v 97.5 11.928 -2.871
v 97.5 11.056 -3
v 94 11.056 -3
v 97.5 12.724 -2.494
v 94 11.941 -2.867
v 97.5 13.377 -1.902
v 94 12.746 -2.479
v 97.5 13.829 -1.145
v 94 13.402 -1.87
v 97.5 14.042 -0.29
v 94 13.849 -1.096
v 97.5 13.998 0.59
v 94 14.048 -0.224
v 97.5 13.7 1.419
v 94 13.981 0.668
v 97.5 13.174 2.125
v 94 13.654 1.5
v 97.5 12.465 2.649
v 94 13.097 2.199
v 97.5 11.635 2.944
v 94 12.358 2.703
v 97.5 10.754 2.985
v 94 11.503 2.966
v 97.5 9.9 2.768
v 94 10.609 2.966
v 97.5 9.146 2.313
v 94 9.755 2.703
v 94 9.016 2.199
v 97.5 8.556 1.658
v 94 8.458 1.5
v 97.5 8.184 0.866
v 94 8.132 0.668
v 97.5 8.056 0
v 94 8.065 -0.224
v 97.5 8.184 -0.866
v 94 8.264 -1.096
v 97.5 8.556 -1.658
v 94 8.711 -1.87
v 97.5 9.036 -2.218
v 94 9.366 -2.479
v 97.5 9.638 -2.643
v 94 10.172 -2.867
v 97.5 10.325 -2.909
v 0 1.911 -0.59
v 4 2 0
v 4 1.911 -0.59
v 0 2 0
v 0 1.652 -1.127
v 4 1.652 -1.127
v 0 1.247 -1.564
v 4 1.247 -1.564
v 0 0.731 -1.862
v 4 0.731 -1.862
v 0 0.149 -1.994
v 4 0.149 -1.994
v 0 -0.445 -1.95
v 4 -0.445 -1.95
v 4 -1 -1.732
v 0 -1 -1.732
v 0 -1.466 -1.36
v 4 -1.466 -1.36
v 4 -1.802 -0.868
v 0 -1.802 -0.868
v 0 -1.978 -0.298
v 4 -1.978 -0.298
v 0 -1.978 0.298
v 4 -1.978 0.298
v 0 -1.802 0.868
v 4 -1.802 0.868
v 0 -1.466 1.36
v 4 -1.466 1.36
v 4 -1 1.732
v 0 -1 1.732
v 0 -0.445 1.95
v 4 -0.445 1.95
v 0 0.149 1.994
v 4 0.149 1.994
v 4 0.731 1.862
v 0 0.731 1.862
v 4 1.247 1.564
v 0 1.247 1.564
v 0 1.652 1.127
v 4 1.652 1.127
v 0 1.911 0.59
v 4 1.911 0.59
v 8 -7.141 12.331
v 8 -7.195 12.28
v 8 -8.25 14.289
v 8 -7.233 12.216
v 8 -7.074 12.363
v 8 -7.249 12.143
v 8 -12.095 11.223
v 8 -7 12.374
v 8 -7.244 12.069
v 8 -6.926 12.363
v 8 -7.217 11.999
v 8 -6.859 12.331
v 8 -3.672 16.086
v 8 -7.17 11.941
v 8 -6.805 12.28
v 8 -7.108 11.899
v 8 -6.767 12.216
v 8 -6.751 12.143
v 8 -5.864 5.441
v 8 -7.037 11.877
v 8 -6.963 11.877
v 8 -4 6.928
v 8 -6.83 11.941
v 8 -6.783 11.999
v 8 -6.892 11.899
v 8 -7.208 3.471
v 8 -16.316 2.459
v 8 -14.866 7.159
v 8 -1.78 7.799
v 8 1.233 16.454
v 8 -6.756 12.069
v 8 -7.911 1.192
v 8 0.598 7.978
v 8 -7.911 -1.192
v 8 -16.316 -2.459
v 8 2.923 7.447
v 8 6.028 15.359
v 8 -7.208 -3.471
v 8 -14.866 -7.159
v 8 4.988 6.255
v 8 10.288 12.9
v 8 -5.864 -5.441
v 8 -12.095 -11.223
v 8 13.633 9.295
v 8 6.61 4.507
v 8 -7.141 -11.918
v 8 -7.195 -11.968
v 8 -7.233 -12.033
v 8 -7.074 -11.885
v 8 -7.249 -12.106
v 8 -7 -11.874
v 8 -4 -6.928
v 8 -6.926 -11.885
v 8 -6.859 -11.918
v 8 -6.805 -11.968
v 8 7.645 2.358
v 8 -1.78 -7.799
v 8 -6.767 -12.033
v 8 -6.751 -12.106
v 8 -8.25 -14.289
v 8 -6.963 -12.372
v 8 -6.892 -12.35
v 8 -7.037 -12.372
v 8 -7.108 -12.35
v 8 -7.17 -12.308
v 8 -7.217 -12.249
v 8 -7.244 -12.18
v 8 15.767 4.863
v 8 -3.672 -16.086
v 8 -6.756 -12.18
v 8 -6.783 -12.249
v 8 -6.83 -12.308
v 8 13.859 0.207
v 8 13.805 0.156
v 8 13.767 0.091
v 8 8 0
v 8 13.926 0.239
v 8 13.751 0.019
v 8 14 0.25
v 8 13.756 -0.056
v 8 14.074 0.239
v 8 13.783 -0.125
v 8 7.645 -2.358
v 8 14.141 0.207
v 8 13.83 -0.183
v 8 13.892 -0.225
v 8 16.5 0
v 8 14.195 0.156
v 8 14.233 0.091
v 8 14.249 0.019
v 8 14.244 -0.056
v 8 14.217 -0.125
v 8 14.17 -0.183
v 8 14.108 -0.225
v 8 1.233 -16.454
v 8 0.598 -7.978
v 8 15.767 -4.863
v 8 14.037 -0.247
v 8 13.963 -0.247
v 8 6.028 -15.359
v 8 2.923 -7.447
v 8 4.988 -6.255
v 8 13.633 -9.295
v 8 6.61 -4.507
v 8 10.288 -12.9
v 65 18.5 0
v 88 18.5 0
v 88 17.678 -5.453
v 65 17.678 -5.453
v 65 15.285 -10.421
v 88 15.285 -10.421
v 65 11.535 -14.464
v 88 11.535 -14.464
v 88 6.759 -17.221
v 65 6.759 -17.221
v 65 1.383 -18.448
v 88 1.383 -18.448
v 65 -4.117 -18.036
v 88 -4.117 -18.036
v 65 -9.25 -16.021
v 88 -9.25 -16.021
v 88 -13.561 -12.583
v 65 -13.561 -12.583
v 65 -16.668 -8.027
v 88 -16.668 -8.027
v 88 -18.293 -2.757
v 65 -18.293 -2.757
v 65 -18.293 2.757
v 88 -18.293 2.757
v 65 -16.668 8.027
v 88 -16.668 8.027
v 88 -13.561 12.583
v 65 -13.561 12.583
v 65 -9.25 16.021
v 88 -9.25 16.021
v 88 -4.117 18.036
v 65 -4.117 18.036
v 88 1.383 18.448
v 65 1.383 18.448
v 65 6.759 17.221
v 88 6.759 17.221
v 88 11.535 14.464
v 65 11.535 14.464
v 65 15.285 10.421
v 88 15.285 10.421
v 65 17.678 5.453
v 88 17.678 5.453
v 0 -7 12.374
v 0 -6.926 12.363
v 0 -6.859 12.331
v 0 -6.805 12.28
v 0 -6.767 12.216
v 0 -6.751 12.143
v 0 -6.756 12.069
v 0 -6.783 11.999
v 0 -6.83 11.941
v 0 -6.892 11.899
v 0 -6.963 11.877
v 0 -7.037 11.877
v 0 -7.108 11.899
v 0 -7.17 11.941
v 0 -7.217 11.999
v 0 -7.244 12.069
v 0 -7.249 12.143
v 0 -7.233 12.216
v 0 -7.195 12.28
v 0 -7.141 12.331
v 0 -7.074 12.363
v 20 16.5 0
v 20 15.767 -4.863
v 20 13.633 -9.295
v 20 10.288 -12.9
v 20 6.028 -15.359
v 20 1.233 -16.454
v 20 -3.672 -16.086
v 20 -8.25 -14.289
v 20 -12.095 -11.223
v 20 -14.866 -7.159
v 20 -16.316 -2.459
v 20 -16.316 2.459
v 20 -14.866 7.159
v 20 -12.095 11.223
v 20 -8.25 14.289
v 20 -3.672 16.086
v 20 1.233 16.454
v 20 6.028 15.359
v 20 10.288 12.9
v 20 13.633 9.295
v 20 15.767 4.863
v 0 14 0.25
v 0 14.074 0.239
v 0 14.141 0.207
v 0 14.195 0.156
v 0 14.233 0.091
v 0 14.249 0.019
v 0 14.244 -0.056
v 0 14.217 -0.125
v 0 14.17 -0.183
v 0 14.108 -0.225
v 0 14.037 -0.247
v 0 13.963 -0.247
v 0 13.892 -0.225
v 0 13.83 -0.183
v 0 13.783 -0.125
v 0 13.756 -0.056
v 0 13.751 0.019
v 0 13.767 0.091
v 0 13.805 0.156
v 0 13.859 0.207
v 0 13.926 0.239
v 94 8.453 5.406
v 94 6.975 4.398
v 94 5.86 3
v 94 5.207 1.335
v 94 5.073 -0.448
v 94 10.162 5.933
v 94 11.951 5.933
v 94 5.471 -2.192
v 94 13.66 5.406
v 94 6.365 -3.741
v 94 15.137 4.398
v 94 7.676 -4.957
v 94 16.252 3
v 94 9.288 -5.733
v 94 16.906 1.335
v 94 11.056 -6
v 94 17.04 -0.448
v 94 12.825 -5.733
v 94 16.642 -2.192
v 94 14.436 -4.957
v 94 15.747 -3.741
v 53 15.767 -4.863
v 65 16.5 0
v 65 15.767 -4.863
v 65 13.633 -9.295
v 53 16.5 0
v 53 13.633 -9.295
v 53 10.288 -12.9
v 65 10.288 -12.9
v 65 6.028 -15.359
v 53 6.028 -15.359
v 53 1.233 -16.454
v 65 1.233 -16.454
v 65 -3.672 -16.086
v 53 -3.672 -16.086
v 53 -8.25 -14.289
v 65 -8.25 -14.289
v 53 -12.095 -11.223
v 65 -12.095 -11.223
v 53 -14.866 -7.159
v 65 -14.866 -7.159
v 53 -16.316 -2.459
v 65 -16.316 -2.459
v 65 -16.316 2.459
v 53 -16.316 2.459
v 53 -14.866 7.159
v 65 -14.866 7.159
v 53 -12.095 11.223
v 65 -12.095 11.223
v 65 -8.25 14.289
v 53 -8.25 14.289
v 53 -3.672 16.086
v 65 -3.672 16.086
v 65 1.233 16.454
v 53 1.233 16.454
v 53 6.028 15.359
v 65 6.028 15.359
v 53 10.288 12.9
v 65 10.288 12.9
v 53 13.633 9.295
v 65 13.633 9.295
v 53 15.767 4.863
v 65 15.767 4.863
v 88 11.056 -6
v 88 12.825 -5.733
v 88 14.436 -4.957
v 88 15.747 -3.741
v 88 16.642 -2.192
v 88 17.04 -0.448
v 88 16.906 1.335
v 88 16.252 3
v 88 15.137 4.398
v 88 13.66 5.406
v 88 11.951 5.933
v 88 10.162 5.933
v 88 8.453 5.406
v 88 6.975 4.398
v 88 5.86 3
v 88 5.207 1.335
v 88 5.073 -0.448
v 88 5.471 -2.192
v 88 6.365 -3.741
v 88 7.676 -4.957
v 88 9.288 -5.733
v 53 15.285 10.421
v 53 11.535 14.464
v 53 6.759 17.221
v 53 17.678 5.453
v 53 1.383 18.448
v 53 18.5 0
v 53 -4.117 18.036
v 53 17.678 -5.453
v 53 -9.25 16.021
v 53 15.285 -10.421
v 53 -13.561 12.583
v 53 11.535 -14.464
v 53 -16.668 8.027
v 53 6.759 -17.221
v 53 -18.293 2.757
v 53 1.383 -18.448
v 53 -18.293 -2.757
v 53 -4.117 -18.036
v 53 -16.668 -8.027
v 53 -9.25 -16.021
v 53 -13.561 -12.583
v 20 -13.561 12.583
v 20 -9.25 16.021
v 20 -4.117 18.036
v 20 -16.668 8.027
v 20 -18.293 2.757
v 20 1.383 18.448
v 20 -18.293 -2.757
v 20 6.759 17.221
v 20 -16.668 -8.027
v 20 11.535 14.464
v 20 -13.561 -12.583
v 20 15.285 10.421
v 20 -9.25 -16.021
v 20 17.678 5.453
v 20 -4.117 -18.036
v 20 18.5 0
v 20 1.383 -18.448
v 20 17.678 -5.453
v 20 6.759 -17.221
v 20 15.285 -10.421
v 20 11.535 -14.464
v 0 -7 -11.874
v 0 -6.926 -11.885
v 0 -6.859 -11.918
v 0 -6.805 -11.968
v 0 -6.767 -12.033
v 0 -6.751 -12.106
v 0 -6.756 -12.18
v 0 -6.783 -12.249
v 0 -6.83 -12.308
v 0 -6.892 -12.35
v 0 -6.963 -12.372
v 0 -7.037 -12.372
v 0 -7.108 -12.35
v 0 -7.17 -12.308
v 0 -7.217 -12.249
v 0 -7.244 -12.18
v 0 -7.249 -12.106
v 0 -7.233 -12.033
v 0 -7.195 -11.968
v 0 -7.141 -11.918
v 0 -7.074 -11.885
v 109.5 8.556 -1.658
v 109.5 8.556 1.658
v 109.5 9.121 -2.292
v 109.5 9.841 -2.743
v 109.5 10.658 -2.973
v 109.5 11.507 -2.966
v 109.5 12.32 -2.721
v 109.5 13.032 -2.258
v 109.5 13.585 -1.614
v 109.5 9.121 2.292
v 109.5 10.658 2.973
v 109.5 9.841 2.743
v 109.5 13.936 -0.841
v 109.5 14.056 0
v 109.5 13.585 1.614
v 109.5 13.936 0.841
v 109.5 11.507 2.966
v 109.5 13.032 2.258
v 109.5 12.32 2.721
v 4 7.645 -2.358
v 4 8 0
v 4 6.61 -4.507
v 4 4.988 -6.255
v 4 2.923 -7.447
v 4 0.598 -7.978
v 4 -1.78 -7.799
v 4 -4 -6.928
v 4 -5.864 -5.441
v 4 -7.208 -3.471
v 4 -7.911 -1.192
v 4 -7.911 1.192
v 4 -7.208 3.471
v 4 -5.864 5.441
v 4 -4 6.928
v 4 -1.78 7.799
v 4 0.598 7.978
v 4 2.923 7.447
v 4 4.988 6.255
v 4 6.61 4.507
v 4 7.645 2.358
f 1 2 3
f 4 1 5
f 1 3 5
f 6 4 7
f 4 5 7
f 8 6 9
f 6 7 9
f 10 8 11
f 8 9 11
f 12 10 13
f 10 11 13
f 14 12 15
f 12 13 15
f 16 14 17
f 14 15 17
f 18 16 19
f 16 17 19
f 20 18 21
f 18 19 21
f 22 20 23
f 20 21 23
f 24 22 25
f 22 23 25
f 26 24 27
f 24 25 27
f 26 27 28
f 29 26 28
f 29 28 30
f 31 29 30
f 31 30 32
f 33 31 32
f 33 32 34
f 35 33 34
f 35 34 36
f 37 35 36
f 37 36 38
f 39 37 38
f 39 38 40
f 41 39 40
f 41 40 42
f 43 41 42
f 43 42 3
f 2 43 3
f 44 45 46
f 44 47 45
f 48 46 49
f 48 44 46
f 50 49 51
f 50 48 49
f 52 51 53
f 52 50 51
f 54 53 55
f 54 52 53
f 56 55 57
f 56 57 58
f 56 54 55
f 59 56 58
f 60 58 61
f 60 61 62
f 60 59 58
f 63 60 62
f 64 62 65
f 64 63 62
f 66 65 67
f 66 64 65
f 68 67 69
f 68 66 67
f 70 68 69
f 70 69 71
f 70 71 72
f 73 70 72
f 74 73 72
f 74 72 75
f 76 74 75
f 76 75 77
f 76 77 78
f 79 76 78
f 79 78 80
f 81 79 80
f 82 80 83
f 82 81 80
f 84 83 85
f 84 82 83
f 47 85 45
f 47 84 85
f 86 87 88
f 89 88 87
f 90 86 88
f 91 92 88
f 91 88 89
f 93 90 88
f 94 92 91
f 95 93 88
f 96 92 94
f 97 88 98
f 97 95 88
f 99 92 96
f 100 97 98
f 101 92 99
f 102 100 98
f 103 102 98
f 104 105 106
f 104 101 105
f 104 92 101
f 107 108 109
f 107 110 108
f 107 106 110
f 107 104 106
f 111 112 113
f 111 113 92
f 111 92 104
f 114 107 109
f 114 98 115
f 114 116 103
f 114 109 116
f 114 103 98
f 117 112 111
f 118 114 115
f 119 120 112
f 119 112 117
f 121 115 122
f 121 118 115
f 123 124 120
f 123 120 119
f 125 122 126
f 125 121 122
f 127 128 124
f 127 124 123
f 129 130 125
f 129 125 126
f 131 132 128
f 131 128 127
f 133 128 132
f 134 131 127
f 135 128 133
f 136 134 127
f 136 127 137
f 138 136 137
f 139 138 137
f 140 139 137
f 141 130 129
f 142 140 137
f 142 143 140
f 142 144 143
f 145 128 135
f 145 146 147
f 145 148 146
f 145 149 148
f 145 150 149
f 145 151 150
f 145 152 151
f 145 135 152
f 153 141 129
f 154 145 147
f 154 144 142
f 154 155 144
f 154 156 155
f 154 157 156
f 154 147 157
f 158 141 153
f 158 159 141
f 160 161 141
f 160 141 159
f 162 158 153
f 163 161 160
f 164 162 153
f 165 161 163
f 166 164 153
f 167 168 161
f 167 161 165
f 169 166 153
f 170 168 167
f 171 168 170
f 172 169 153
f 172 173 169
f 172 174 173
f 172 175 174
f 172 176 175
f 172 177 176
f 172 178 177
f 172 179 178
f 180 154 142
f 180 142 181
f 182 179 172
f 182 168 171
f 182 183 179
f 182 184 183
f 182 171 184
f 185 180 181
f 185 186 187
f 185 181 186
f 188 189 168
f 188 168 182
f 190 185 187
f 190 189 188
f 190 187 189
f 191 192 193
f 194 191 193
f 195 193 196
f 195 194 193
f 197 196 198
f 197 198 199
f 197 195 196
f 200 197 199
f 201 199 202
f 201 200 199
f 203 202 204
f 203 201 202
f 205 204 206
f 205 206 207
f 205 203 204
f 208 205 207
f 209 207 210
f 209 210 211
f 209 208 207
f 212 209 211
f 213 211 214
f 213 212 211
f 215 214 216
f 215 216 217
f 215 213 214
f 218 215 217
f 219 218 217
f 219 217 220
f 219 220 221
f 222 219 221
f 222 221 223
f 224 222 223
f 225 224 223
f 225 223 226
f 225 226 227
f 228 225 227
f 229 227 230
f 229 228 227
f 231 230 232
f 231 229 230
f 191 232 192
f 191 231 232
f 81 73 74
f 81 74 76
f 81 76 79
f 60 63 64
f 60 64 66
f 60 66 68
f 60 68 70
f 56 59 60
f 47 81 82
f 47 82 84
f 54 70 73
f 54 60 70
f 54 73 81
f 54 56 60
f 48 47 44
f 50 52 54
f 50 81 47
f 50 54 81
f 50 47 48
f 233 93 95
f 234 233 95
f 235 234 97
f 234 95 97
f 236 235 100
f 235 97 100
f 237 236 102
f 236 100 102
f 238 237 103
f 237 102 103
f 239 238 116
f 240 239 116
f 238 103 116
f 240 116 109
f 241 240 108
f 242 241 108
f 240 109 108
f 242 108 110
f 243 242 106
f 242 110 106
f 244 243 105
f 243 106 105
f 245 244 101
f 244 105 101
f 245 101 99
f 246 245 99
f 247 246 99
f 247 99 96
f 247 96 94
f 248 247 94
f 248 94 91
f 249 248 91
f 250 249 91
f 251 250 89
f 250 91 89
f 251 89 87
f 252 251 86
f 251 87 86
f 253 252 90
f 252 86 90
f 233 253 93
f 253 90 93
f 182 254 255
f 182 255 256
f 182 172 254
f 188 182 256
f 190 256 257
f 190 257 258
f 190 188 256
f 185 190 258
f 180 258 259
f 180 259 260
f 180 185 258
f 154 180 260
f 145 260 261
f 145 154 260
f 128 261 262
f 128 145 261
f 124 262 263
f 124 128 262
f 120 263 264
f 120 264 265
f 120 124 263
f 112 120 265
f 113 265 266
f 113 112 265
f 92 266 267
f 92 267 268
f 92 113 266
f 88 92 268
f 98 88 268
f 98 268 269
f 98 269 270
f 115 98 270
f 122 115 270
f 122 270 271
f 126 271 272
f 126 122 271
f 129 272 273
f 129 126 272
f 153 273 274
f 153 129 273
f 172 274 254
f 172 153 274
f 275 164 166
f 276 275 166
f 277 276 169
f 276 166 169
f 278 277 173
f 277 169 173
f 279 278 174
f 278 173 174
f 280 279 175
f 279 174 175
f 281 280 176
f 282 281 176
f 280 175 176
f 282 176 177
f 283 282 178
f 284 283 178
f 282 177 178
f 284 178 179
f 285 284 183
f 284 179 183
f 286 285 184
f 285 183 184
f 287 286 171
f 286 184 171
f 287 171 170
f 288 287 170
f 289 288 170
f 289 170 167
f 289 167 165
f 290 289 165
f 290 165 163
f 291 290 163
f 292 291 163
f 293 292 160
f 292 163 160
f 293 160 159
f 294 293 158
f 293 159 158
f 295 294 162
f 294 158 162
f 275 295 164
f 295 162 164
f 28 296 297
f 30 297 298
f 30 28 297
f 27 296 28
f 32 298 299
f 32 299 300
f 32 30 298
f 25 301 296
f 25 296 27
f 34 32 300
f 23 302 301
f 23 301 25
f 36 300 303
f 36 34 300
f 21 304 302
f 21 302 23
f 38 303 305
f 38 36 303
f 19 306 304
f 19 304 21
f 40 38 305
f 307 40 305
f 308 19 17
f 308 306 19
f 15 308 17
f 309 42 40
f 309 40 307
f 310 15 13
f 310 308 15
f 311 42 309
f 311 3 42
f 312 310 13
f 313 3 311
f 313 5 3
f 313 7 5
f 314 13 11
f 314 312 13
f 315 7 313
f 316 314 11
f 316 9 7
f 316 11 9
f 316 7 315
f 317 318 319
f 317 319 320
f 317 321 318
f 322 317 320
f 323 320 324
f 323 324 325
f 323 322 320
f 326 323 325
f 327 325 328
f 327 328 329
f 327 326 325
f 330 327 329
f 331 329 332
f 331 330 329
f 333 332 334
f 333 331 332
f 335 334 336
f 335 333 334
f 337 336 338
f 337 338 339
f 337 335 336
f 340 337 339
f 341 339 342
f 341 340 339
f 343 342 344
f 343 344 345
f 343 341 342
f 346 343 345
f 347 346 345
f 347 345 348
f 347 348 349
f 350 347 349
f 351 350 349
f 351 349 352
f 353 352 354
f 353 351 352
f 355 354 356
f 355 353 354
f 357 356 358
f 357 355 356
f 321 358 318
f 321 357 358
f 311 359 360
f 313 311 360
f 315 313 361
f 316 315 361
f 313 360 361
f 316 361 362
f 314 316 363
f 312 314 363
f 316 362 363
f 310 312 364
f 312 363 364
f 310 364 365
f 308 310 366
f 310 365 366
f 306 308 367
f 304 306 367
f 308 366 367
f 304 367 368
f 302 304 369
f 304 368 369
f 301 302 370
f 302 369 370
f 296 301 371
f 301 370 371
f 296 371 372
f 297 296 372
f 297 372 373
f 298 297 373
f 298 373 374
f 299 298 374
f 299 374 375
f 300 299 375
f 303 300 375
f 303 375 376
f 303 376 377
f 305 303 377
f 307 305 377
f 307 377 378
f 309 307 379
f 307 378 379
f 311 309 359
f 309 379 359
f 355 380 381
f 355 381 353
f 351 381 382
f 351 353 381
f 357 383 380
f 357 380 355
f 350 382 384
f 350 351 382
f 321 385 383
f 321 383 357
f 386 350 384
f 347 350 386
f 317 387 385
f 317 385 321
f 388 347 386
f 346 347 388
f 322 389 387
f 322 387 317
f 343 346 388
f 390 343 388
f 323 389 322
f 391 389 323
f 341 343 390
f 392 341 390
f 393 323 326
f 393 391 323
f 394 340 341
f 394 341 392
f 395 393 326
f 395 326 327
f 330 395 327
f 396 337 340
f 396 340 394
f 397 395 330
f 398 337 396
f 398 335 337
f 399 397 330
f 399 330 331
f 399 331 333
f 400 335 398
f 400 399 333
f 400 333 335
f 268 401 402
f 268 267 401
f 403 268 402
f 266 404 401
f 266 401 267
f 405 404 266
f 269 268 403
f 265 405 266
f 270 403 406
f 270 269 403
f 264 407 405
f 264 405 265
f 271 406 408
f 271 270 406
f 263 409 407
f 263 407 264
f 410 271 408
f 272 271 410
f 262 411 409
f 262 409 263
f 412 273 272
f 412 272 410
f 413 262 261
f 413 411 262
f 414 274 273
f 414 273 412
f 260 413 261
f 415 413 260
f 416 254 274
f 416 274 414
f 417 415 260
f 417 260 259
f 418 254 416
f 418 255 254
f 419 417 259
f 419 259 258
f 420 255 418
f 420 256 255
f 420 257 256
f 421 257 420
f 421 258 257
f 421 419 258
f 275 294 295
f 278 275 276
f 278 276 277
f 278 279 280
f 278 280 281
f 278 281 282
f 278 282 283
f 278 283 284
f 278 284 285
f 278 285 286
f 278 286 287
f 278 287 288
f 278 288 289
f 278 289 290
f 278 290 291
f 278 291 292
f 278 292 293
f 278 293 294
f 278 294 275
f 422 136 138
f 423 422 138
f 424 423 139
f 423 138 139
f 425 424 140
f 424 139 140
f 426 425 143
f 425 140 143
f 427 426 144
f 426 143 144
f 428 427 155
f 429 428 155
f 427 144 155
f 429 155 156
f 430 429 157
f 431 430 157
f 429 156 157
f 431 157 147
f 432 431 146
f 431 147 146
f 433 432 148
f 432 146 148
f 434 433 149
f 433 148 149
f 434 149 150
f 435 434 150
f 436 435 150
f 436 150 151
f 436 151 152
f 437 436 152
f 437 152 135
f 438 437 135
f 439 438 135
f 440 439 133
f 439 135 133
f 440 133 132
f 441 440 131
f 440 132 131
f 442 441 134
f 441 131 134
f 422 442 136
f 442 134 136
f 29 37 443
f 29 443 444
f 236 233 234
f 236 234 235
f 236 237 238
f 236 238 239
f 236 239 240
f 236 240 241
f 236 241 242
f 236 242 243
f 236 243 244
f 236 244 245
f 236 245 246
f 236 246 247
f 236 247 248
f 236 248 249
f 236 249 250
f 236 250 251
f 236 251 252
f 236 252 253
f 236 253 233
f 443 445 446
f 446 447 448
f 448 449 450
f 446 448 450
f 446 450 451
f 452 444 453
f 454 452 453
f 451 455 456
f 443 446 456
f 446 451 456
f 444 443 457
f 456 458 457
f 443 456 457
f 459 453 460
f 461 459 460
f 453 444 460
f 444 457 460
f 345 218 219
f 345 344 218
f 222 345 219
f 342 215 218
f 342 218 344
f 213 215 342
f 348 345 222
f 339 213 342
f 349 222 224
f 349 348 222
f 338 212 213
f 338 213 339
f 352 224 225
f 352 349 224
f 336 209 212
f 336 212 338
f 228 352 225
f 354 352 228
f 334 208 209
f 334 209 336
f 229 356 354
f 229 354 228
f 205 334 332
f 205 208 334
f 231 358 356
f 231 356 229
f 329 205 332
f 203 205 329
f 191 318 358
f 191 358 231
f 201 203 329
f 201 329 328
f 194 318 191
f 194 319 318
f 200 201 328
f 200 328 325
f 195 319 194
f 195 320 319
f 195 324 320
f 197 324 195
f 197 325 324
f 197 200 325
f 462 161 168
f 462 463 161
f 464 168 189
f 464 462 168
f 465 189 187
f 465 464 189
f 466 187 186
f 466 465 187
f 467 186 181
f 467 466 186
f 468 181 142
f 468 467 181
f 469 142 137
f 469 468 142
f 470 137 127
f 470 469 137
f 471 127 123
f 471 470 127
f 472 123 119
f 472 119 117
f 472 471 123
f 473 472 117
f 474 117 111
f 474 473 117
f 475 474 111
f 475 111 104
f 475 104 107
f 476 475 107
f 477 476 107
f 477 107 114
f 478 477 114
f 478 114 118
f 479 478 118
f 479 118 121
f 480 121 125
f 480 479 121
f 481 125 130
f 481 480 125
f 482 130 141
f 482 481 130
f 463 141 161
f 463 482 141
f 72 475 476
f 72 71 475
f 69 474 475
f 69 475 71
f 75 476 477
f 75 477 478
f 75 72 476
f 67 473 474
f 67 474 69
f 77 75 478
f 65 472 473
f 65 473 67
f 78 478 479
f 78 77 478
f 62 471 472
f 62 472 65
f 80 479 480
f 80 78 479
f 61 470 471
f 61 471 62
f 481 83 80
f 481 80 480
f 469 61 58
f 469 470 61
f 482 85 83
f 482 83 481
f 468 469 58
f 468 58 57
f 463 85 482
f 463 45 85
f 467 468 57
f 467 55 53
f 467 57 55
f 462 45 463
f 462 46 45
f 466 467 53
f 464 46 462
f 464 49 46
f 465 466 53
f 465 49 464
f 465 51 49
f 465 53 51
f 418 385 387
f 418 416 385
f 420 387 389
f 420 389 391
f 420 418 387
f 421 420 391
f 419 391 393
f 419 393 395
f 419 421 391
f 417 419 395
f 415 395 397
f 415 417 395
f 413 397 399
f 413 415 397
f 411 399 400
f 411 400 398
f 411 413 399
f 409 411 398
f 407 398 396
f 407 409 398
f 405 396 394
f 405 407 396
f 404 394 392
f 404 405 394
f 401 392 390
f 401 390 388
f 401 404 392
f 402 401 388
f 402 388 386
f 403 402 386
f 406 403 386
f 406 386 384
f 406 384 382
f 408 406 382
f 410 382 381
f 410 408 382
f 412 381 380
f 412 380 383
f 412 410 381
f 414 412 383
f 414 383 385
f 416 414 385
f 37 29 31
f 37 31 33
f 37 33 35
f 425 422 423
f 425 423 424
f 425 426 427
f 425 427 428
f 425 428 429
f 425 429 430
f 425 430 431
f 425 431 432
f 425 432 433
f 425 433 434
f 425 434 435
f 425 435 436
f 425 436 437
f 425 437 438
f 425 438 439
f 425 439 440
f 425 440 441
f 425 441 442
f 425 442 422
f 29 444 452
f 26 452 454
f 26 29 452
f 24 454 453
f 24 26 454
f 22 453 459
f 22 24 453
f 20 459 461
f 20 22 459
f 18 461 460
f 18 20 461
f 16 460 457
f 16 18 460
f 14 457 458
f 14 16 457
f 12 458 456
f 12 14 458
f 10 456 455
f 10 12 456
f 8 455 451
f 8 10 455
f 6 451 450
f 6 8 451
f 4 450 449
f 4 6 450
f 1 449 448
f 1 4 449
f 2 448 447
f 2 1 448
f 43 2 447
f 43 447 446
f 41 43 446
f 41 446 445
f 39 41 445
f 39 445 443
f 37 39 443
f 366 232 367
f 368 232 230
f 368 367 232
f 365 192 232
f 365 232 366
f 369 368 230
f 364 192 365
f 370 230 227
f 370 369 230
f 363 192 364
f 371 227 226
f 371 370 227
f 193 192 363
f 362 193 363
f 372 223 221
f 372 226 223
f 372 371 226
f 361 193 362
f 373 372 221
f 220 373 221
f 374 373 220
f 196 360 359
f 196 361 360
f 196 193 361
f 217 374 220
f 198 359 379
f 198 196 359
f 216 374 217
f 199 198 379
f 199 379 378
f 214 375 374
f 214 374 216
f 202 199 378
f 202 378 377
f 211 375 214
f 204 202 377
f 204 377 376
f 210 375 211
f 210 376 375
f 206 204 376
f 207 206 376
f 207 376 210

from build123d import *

# Parameters (mm, degrees)
SKETCH3_R           = 6
BOSS_EXTRUDE1_DEPTH = 6
SKETCH4_R           = 3
BOSS_EXTRUDE2_DEPTH = 3.5
BOSS_EXTRUDE3_DEPTH = 12
SKETCH6_R           = 0.25
BOSS_EXTRUDE4_DEPTH = 8


with BuildPart() as part:
    # Sketch2 → Revolve1 (revolve)
    with BuildSketch(Plane.XY):
        Polygon((88, 0), (88, 18.5), (65, 18.5), (65, 16.5), (53, 16.5), (53, 18.5), (20, 18.5), (20, 16.5), (8, 16.5), (8, 8), (4, 8), (4, 2), (0, 2), (0, 0), align=None)
    revolve(axis=Axis((88, 0, 0), (-1, 0, 0)))

    # Sketch3 → Boss-Extrude1 (add)
    with BuildSketch(Plane(origin=(88, 0, 0), x_dir=(0, 0, -1), z_dir=(1, 0, 0))):
        with Locations((0, 11.056321537)):
            Circle(SKETCH3_R)
    extrude(amount=BOSS_EXTRUDE1_DEPTH)

    # Sketch4 → Boss-Extrude2 (add)
    with BuildSketch(Plane(origin=(94, 0, 0), x_dir=(0, 0, -1), z_dir=(1, 0, 0))):
        with Locations((0, 11.056321537)):
            Circle(SKETCH4_R)
    extrude(amount=BOSS_EXTRUDE2_DEPTH)

    # Sketch5 → Boss-Extrude3 (add)
    with BuildSketch(Plane(origin=(97.5, 0, 0), x_dir=(0, 0, -1), z_dir=(1, 0, 0))):
        with BuildLine():
            Line((1.658312395, 8.556321537), (-1.658312395, 8.556321537))
            ThreePointArc((-1.658312395, 8.556321537), (0, 14.056321537), (1.658312395, 8.556321537))
        make_face()
    extrude(amount=BOSS_EXTRUDE3_DEPTH)

    # Sketch6 → Boss-Extrude4 (add)
    with BuildSketch(Plane.ZY.offset(-8)):
        with Locations((0, 14)):
            Circle(SKETCH6_R)
        with Locations((12.124355653, -7)):
            Circle(SKETCH6_R)
        with Locations((-12.124355653, -7)):
            Circle(SKETCH6_R)
    extrude(amount=BOSS_EXTRUDE4_DEPTH)


solid = part.part
